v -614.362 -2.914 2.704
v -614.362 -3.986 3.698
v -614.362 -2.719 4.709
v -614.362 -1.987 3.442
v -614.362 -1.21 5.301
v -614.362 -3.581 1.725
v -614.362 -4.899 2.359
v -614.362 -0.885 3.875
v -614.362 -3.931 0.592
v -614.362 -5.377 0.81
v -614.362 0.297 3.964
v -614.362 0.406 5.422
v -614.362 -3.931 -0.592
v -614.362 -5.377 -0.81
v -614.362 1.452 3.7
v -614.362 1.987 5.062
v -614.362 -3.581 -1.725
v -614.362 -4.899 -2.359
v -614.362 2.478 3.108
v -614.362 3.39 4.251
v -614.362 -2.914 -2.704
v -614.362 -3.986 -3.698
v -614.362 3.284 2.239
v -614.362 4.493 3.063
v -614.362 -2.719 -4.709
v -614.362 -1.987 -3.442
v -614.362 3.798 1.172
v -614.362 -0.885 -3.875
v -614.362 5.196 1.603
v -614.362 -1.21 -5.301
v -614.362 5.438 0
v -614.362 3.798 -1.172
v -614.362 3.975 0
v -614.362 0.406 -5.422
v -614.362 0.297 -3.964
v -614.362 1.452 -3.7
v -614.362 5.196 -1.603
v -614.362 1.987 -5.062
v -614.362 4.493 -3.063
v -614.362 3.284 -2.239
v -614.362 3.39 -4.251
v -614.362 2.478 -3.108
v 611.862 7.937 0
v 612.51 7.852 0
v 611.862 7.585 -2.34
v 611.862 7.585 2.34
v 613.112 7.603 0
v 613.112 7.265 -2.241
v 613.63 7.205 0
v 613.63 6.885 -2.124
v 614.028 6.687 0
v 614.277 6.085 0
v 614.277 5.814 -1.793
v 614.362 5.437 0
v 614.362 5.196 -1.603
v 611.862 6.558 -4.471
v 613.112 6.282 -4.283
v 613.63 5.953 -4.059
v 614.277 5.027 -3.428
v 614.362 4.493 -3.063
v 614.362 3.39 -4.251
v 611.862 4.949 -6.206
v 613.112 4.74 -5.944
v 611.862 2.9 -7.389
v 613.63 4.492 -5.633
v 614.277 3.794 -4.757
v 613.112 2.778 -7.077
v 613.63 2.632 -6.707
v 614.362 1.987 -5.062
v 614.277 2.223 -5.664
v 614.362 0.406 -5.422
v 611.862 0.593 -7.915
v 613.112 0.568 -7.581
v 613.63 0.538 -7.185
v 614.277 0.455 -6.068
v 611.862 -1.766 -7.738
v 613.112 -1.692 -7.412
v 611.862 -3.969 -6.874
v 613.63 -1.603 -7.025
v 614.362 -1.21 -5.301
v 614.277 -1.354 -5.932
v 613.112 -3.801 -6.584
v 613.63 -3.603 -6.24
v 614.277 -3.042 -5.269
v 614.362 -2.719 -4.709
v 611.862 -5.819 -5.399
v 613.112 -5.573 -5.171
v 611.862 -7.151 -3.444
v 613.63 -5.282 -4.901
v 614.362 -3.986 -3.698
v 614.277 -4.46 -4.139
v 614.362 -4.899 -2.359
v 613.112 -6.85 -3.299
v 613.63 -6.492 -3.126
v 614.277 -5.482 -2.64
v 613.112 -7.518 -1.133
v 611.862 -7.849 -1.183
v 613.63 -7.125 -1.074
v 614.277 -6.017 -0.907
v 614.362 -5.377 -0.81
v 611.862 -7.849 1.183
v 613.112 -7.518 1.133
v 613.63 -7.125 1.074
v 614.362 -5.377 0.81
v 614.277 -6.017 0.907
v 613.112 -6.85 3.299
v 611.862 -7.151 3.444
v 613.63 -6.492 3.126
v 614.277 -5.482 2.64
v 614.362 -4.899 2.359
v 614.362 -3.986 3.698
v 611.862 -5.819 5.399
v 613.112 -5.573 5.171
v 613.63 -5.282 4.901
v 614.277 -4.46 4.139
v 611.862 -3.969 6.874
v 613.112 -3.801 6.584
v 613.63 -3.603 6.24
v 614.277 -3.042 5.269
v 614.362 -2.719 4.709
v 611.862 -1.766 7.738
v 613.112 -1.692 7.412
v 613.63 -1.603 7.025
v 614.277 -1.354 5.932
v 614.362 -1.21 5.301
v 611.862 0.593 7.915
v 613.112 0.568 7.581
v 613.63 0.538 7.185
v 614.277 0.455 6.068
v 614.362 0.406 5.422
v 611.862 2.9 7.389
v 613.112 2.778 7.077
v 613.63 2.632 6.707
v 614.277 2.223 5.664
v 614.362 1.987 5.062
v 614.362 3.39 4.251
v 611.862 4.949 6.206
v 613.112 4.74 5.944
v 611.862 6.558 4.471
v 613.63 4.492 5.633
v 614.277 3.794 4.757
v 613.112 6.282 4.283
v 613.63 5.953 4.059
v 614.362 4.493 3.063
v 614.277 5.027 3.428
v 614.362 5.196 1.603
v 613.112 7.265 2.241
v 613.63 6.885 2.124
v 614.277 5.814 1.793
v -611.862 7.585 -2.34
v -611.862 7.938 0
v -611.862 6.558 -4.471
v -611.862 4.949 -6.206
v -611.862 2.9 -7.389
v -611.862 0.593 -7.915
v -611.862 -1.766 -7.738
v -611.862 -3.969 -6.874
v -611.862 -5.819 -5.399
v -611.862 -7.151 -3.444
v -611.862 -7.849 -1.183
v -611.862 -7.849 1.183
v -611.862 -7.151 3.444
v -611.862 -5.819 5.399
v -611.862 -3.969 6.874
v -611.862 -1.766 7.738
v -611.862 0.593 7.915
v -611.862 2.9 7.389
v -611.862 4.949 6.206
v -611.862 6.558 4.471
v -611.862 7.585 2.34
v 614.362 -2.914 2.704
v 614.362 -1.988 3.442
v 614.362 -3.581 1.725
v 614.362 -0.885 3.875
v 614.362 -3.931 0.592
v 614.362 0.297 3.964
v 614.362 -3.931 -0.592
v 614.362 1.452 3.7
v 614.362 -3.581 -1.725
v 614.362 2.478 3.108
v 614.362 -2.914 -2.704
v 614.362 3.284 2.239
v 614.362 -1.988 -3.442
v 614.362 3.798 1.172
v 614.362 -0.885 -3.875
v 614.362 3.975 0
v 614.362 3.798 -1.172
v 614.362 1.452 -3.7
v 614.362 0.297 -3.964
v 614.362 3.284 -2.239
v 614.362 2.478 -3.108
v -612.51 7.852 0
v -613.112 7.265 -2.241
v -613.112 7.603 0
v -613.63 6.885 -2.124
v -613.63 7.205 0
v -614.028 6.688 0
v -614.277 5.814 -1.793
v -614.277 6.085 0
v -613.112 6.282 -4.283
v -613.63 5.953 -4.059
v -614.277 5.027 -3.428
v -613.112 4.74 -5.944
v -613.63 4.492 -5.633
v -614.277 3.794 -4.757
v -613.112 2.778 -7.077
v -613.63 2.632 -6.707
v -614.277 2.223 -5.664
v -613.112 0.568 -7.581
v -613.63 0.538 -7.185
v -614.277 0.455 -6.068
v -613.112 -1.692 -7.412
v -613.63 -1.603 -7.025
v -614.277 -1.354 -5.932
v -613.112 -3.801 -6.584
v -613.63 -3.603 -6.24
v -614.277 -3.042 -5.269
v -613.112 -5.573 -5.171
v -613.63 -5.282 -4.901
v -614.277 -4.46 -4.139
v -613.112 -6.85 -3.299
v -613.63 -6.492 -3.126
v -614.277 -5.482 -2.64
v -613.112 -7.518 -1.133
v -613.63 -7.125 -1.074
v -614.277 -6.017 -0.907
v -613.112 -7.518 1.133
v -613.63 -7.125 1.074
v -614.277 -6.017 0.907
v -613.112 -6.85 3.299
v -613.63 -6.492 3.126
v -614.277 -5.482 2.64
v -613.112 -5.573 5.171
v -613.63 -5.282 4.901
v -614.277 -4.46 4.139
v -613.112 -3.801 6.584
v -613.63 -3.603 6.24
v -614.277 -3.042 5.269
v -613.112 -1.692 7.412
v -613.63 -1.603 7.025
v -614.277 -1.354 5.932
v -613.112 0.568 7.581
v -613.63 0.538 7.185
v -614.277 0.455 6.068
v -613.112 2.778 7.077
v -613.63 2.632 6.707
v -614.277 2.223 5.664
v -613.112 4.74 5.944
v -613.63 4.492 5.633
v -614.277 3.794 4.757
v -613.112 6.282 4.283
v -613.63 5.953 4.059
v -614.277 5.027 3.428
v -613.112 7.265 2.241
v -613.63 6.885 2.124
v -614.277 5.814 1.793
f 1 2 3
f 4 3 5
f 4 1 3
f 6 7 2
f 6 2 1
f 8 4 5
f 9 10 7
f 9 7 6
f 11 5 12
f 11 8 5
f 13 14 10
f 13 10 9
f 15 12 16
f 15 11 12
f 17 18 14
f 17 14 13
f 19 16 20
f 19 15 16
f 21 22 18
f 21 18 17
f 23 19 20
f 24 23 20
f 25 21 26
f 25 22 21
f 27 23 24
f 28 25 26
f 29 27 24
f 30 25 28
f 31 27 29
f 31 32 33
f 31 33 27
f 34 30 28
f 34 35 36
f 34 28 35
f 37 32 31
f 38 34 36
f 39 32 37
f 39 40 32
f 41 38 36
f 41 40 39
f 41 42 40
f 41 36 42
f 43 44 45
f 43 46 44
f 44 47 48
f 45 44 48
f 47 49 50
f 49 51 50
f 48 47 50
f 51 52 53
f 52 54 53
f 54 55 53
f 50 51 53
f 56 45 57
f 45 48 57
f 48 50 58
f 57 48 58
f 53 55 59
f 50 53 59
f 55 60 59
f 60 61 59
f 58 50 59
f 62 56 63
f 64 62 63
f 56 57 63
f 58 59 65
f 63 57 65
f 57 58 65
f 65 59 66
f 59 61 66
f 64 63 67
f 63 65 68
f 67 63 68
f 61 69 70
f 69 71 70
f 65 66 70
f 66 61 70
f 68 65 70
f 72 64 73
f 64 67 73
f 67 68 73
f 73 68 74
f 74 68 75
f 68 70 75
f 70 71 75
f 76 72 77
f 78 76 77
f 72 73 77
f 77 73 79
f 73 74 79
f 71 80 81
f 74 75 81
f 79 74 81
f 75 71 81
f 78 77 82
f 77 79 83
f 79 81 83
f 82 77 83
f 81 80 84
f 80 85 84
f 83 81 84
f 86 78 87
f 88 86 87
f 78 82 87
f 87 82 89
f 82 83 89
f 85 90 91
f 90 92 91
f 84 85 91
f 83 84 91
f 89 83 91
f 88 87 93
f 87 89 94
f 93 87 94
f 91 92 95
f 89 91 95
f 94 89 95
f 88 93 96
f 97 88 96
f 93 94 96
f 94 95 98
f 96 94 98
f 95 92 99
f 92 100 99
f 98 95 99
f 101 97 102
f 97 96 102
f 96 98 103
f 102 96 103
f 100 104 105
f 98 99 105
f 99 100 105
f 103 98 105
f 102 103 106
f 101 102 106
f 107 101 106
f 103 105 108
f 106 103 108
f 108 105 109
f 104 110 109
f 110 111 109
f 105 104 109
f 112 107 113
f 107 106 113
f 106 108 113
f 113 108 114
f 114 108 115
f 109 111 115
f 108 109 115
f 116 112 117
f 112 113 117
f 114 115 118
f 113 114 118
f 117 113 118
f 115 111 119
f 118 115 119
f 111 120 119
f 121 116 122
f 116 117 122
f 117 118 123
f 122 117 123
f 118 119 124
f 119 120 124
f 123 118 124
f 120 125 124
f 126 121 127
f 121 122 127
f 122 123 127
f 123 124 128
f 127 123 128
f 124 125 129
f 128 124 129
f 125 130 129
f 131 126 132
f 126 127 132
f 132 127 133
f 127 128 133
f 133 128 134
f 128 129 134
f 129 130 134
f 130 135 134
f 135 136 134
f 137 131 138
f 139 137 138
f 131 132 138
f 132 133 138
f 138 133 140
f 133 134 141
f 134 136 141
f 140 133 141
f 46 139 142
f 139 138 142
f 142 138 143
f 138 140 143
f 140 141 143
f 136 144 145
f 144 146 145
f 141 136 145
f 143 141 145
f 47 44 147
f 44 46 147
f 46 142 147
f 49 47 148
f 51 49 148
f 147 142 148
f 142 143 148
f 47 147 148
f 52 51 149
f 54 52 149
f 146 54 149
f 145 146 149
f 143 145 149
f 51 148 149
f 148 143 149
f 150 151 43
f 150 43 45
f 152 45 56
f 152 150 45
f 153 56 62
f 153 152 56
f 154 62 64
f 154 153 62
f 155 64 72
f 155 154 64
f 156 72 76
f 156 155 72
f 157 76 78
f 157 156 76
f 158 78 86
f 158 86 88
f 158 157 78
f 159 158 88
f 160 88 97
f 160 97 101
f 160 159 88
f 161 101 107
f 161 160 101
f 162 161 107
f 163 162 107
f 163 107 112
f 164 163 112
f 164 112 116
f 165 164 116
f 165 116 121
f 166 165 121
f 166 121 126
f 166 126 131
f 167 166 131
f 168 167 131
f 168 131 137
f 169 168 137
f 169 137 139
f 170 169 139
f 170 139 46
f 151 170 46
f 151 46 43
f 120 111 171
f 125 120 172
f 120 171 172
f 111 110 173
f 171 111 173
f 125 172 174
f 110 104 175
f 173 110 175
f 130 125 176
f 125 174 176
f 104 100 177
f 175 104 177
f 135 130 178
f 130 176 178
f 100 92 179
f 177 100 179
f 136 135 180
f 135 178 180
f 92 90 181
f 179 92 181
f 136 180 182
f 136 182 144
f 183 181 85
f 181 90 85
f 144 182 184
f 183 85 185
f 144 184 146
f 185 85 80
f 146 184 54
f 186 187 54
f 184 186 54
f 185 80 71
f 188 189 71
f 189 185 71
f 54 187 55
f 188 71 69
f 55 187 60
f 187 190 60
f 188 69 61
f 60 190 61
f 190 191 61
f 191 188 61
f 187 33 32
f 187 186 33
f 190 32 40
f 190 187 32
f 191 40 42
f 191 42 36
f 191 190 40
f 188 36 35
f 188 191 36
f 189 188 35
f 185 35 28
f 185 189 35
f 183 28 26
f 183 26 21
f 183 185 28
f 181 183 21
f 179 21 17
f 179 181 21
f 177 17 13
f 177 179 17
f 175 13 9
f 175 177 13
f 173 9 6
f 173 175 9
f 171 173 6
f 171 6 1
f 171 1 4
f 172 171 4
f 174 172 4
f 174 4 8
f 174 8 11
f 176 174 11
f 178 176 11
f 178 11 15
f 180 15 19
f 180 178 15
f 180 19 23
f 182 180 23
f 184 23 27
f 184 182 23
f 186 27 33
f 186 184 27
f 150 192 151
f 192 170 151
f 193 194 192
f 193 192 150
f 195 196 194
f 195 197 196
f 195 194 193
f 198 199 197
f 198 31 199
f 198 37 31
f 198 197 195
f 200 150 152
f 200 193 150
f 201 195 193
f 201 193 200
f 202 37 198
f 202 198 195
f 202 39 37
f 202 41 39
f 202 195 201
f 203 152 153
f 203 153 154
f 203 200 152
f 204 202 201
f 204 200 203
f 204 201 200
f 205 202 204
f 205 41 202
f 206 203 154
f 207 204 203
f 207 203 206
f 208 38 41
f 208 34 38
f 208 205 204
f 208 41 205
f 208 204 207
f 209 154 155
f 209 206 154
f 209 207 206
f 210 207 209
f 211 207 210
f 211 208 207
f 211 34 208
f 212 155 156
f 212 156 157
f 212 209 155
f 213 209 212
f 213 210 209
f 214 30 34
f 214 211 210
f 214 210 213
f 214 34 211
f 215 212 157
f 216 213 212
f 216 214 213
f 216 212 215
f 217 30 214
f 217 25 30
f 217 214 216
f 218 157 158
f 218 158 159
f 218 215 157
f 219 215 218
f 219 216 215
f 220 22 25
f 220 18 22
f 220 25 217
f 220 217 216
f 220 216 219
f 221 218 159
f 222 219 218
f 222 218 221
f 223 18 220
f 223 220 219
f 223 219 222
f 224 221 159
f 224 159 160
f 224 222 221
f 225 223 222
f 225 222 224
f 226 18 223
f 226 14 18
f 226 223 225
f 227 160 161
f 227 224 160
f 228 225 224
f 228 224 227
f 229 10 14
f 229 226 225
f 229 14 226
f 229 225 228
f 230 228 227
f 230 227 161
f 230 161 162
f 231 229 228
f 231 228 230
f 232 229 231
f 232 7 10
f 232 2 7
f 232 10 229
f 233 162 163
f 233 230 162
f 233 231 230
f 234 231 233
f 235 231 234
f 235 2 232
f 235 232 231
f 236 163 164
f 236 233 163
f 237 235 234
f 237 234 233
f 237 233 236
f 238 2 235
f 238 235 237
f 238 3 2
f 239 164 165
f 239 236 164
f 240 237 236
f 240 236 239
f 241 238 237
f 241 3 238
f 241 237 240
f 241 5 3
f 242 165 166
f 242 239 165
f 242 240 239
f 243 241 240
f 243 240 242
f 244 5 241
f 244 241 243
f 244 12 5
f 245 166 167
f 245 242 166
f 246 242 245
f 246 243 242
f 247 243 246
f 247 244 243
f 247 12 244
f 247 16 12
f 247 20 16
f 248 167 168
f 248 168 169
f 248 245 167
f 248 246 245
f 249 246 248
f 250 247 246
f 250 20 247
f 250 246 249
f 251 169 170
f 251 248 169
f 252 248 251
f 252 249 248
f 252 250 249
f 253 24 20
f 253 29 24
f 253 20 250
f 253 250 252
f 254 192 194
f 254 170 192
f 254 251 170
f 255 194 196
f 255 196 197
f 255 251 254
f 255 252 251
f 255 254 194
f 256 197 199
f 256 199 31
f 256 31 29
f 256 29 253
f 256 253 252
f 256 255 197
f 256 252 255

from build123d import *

# Parameters (mm, degrees)
SKETCH_1_R        = 7.9375
SKETCH_1_R_2      = 3.975
EXTRUDE_1_DEPTH   = 614.3625
FILLET_1_R        = 2.5
MOVE_BODY_1_ANGLE = 90


with BuildPart() as part:
    # 스케치1 → 보스-돌출1 (new body, symmetric)
    with BuildSketch(Plane(origin=(0, 0, 0), x_dir=(1, 0, 0), z_dir=(0, 1, 0))):
        Circle(SKETCH_1_R)
        Circle(SKETCH_1_R_2, mode=Mode.SUBTRACT)
    extrude(amount=EXTRUDE_1_DEPTH, both=True)

    # 필렛1
    fillet_1_edges = [part.edges().sort_by_distance(p)[0] for p in [
        (-7.9375, -614.3625, 0),
        (-7.9375, 614.3625, 0),
    ]]
    fillet(fillet_1_edges, radius=FILLET_1_R)


with BuildPart() as part_1:
    # Move Body 1: moved
    add(part.part.rotate(Axis((0, 0, 0), (0, 0, 1)), MOVE_BODY_1_ANGLE))


solid = part_1.part
